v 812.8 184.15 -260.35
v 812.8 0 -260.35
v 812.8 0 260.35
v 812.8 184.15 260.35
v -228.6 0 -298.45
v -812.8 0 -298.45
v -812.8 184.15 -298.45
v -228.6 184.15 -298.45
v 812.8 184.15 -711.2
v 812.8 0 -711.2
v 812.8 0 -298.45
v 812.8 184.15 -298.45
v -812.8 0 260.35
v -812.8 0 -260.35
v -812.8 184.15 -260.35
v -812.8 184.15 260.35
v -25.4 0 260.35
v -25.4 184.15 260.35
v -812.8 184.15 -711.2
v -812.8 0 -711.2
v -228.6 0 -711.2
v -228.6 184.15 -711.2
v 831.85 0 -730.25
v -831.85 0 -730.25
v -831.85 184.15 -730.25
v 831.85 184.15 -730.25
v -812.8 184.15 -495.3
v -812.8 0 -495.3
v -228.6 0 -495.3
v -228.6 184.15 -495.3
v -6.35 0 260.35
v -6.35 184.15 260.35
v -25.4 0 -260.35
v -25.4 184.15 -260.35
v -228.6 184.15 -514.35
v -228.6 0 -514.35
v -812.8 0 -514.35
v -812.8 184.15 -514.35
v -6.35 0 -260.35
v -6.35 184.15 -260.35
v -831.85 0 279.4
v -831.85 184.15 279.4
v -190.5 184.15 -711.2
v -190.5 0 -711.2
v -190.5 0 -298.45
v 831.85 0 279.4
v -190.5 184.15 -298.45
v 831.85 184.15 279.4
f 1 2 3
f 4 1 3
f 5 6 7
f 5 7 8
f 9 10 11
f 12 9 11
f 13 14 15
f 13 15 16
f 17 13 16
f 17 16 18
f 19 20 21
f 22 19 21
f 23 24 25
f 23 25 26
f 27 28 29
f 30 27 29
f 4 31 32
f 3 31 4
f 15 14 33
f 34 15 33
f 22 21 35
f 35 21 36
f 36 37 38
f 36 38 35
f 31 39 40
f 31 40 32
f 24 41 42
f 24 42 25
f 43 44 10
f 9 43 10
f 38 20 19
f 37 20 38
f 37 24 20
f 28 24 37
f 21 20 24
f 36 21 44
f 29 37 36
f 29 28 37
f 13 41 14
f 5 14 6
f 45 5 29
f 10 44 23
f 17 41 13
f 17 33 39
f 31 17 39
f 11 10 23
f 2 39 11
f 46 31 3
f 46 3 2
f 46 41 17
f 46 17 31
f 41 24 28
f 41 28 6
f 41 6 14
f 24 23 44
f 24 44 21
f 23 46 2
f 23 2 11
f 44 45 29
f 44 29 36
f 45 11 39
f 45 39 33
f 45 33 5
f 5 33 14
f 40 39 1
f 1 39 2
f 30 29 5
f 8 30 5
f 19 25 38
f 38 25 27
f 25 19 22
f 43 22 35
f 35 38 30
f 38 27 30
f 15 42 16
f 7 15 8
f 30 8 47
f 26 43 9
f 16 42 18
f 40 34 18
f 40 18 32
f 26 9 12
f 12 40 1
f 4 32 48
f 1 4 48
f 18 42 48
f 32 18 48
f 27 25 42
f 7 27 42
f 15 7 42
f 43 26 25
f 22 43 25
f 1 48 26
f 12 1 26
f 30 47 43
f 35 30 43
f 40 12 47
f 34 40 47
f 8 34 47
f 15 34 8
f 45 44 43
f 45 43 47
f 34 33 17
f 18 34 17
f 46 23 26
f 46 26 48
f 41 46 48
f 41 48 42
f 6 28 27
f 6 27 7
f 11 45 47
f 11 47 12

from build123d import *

# Parameters (mm, degrees)
F0_W     = 787.4
F0_H     = 520.7
F0_W_2   = 819.15
F0_W_3   = 622.3
F0_H_2   = 450.85
F0_W_4   = 584.2
F0_H_3   = 196.85
F0_W_5   = 1041.4
F0_W_6   = 1003.3
F0_H_4   = 412.75
F1_DEPTH = 184.15


with BuildPart() as f1:
    # F0 (on Front) → F1 (new body)
    with BuildSketch(Plane.XZ):
        Polygon((831.85, -279.4), (831.85, 279.4), (-831.85, 279.4), (-831.85, -279.4), (-209.55, -279.4), align=None)
        with Locations((-419.1, 0)):
            Rectangle(F0_W, F0_H, mode=Mode.SUBTRACT)
        with Locations((403.225, 0)):
            Rectangle(F0_W_2, F0_H, mode=Mode.SUBTRACT)
        with Locations((-520.7, -504.825)):
            Rectangle(F0_W_3, F0_H_2)
        with Locations((-520.7, -612.775)):
            Rectangle(F0_W_4, F0_H_3, mode=Mode.SUBTRACT)
        with Locations((-520.7, -396.875)):
            Rectangle(F0_W_4, F0_H_3, mode=Mode.SUBTRACT)
        with Locations((311.15, -504.825)):
            Rectangle(F0_W_5, F0_H_2)
        with Locations((311.15, -504.825)):
            Rectangle(F0_W_6, F0_H_4, mode=Mode.SUBTRACT)
    extrude(amount=-F1_DEPTH)


solid = f1.part
